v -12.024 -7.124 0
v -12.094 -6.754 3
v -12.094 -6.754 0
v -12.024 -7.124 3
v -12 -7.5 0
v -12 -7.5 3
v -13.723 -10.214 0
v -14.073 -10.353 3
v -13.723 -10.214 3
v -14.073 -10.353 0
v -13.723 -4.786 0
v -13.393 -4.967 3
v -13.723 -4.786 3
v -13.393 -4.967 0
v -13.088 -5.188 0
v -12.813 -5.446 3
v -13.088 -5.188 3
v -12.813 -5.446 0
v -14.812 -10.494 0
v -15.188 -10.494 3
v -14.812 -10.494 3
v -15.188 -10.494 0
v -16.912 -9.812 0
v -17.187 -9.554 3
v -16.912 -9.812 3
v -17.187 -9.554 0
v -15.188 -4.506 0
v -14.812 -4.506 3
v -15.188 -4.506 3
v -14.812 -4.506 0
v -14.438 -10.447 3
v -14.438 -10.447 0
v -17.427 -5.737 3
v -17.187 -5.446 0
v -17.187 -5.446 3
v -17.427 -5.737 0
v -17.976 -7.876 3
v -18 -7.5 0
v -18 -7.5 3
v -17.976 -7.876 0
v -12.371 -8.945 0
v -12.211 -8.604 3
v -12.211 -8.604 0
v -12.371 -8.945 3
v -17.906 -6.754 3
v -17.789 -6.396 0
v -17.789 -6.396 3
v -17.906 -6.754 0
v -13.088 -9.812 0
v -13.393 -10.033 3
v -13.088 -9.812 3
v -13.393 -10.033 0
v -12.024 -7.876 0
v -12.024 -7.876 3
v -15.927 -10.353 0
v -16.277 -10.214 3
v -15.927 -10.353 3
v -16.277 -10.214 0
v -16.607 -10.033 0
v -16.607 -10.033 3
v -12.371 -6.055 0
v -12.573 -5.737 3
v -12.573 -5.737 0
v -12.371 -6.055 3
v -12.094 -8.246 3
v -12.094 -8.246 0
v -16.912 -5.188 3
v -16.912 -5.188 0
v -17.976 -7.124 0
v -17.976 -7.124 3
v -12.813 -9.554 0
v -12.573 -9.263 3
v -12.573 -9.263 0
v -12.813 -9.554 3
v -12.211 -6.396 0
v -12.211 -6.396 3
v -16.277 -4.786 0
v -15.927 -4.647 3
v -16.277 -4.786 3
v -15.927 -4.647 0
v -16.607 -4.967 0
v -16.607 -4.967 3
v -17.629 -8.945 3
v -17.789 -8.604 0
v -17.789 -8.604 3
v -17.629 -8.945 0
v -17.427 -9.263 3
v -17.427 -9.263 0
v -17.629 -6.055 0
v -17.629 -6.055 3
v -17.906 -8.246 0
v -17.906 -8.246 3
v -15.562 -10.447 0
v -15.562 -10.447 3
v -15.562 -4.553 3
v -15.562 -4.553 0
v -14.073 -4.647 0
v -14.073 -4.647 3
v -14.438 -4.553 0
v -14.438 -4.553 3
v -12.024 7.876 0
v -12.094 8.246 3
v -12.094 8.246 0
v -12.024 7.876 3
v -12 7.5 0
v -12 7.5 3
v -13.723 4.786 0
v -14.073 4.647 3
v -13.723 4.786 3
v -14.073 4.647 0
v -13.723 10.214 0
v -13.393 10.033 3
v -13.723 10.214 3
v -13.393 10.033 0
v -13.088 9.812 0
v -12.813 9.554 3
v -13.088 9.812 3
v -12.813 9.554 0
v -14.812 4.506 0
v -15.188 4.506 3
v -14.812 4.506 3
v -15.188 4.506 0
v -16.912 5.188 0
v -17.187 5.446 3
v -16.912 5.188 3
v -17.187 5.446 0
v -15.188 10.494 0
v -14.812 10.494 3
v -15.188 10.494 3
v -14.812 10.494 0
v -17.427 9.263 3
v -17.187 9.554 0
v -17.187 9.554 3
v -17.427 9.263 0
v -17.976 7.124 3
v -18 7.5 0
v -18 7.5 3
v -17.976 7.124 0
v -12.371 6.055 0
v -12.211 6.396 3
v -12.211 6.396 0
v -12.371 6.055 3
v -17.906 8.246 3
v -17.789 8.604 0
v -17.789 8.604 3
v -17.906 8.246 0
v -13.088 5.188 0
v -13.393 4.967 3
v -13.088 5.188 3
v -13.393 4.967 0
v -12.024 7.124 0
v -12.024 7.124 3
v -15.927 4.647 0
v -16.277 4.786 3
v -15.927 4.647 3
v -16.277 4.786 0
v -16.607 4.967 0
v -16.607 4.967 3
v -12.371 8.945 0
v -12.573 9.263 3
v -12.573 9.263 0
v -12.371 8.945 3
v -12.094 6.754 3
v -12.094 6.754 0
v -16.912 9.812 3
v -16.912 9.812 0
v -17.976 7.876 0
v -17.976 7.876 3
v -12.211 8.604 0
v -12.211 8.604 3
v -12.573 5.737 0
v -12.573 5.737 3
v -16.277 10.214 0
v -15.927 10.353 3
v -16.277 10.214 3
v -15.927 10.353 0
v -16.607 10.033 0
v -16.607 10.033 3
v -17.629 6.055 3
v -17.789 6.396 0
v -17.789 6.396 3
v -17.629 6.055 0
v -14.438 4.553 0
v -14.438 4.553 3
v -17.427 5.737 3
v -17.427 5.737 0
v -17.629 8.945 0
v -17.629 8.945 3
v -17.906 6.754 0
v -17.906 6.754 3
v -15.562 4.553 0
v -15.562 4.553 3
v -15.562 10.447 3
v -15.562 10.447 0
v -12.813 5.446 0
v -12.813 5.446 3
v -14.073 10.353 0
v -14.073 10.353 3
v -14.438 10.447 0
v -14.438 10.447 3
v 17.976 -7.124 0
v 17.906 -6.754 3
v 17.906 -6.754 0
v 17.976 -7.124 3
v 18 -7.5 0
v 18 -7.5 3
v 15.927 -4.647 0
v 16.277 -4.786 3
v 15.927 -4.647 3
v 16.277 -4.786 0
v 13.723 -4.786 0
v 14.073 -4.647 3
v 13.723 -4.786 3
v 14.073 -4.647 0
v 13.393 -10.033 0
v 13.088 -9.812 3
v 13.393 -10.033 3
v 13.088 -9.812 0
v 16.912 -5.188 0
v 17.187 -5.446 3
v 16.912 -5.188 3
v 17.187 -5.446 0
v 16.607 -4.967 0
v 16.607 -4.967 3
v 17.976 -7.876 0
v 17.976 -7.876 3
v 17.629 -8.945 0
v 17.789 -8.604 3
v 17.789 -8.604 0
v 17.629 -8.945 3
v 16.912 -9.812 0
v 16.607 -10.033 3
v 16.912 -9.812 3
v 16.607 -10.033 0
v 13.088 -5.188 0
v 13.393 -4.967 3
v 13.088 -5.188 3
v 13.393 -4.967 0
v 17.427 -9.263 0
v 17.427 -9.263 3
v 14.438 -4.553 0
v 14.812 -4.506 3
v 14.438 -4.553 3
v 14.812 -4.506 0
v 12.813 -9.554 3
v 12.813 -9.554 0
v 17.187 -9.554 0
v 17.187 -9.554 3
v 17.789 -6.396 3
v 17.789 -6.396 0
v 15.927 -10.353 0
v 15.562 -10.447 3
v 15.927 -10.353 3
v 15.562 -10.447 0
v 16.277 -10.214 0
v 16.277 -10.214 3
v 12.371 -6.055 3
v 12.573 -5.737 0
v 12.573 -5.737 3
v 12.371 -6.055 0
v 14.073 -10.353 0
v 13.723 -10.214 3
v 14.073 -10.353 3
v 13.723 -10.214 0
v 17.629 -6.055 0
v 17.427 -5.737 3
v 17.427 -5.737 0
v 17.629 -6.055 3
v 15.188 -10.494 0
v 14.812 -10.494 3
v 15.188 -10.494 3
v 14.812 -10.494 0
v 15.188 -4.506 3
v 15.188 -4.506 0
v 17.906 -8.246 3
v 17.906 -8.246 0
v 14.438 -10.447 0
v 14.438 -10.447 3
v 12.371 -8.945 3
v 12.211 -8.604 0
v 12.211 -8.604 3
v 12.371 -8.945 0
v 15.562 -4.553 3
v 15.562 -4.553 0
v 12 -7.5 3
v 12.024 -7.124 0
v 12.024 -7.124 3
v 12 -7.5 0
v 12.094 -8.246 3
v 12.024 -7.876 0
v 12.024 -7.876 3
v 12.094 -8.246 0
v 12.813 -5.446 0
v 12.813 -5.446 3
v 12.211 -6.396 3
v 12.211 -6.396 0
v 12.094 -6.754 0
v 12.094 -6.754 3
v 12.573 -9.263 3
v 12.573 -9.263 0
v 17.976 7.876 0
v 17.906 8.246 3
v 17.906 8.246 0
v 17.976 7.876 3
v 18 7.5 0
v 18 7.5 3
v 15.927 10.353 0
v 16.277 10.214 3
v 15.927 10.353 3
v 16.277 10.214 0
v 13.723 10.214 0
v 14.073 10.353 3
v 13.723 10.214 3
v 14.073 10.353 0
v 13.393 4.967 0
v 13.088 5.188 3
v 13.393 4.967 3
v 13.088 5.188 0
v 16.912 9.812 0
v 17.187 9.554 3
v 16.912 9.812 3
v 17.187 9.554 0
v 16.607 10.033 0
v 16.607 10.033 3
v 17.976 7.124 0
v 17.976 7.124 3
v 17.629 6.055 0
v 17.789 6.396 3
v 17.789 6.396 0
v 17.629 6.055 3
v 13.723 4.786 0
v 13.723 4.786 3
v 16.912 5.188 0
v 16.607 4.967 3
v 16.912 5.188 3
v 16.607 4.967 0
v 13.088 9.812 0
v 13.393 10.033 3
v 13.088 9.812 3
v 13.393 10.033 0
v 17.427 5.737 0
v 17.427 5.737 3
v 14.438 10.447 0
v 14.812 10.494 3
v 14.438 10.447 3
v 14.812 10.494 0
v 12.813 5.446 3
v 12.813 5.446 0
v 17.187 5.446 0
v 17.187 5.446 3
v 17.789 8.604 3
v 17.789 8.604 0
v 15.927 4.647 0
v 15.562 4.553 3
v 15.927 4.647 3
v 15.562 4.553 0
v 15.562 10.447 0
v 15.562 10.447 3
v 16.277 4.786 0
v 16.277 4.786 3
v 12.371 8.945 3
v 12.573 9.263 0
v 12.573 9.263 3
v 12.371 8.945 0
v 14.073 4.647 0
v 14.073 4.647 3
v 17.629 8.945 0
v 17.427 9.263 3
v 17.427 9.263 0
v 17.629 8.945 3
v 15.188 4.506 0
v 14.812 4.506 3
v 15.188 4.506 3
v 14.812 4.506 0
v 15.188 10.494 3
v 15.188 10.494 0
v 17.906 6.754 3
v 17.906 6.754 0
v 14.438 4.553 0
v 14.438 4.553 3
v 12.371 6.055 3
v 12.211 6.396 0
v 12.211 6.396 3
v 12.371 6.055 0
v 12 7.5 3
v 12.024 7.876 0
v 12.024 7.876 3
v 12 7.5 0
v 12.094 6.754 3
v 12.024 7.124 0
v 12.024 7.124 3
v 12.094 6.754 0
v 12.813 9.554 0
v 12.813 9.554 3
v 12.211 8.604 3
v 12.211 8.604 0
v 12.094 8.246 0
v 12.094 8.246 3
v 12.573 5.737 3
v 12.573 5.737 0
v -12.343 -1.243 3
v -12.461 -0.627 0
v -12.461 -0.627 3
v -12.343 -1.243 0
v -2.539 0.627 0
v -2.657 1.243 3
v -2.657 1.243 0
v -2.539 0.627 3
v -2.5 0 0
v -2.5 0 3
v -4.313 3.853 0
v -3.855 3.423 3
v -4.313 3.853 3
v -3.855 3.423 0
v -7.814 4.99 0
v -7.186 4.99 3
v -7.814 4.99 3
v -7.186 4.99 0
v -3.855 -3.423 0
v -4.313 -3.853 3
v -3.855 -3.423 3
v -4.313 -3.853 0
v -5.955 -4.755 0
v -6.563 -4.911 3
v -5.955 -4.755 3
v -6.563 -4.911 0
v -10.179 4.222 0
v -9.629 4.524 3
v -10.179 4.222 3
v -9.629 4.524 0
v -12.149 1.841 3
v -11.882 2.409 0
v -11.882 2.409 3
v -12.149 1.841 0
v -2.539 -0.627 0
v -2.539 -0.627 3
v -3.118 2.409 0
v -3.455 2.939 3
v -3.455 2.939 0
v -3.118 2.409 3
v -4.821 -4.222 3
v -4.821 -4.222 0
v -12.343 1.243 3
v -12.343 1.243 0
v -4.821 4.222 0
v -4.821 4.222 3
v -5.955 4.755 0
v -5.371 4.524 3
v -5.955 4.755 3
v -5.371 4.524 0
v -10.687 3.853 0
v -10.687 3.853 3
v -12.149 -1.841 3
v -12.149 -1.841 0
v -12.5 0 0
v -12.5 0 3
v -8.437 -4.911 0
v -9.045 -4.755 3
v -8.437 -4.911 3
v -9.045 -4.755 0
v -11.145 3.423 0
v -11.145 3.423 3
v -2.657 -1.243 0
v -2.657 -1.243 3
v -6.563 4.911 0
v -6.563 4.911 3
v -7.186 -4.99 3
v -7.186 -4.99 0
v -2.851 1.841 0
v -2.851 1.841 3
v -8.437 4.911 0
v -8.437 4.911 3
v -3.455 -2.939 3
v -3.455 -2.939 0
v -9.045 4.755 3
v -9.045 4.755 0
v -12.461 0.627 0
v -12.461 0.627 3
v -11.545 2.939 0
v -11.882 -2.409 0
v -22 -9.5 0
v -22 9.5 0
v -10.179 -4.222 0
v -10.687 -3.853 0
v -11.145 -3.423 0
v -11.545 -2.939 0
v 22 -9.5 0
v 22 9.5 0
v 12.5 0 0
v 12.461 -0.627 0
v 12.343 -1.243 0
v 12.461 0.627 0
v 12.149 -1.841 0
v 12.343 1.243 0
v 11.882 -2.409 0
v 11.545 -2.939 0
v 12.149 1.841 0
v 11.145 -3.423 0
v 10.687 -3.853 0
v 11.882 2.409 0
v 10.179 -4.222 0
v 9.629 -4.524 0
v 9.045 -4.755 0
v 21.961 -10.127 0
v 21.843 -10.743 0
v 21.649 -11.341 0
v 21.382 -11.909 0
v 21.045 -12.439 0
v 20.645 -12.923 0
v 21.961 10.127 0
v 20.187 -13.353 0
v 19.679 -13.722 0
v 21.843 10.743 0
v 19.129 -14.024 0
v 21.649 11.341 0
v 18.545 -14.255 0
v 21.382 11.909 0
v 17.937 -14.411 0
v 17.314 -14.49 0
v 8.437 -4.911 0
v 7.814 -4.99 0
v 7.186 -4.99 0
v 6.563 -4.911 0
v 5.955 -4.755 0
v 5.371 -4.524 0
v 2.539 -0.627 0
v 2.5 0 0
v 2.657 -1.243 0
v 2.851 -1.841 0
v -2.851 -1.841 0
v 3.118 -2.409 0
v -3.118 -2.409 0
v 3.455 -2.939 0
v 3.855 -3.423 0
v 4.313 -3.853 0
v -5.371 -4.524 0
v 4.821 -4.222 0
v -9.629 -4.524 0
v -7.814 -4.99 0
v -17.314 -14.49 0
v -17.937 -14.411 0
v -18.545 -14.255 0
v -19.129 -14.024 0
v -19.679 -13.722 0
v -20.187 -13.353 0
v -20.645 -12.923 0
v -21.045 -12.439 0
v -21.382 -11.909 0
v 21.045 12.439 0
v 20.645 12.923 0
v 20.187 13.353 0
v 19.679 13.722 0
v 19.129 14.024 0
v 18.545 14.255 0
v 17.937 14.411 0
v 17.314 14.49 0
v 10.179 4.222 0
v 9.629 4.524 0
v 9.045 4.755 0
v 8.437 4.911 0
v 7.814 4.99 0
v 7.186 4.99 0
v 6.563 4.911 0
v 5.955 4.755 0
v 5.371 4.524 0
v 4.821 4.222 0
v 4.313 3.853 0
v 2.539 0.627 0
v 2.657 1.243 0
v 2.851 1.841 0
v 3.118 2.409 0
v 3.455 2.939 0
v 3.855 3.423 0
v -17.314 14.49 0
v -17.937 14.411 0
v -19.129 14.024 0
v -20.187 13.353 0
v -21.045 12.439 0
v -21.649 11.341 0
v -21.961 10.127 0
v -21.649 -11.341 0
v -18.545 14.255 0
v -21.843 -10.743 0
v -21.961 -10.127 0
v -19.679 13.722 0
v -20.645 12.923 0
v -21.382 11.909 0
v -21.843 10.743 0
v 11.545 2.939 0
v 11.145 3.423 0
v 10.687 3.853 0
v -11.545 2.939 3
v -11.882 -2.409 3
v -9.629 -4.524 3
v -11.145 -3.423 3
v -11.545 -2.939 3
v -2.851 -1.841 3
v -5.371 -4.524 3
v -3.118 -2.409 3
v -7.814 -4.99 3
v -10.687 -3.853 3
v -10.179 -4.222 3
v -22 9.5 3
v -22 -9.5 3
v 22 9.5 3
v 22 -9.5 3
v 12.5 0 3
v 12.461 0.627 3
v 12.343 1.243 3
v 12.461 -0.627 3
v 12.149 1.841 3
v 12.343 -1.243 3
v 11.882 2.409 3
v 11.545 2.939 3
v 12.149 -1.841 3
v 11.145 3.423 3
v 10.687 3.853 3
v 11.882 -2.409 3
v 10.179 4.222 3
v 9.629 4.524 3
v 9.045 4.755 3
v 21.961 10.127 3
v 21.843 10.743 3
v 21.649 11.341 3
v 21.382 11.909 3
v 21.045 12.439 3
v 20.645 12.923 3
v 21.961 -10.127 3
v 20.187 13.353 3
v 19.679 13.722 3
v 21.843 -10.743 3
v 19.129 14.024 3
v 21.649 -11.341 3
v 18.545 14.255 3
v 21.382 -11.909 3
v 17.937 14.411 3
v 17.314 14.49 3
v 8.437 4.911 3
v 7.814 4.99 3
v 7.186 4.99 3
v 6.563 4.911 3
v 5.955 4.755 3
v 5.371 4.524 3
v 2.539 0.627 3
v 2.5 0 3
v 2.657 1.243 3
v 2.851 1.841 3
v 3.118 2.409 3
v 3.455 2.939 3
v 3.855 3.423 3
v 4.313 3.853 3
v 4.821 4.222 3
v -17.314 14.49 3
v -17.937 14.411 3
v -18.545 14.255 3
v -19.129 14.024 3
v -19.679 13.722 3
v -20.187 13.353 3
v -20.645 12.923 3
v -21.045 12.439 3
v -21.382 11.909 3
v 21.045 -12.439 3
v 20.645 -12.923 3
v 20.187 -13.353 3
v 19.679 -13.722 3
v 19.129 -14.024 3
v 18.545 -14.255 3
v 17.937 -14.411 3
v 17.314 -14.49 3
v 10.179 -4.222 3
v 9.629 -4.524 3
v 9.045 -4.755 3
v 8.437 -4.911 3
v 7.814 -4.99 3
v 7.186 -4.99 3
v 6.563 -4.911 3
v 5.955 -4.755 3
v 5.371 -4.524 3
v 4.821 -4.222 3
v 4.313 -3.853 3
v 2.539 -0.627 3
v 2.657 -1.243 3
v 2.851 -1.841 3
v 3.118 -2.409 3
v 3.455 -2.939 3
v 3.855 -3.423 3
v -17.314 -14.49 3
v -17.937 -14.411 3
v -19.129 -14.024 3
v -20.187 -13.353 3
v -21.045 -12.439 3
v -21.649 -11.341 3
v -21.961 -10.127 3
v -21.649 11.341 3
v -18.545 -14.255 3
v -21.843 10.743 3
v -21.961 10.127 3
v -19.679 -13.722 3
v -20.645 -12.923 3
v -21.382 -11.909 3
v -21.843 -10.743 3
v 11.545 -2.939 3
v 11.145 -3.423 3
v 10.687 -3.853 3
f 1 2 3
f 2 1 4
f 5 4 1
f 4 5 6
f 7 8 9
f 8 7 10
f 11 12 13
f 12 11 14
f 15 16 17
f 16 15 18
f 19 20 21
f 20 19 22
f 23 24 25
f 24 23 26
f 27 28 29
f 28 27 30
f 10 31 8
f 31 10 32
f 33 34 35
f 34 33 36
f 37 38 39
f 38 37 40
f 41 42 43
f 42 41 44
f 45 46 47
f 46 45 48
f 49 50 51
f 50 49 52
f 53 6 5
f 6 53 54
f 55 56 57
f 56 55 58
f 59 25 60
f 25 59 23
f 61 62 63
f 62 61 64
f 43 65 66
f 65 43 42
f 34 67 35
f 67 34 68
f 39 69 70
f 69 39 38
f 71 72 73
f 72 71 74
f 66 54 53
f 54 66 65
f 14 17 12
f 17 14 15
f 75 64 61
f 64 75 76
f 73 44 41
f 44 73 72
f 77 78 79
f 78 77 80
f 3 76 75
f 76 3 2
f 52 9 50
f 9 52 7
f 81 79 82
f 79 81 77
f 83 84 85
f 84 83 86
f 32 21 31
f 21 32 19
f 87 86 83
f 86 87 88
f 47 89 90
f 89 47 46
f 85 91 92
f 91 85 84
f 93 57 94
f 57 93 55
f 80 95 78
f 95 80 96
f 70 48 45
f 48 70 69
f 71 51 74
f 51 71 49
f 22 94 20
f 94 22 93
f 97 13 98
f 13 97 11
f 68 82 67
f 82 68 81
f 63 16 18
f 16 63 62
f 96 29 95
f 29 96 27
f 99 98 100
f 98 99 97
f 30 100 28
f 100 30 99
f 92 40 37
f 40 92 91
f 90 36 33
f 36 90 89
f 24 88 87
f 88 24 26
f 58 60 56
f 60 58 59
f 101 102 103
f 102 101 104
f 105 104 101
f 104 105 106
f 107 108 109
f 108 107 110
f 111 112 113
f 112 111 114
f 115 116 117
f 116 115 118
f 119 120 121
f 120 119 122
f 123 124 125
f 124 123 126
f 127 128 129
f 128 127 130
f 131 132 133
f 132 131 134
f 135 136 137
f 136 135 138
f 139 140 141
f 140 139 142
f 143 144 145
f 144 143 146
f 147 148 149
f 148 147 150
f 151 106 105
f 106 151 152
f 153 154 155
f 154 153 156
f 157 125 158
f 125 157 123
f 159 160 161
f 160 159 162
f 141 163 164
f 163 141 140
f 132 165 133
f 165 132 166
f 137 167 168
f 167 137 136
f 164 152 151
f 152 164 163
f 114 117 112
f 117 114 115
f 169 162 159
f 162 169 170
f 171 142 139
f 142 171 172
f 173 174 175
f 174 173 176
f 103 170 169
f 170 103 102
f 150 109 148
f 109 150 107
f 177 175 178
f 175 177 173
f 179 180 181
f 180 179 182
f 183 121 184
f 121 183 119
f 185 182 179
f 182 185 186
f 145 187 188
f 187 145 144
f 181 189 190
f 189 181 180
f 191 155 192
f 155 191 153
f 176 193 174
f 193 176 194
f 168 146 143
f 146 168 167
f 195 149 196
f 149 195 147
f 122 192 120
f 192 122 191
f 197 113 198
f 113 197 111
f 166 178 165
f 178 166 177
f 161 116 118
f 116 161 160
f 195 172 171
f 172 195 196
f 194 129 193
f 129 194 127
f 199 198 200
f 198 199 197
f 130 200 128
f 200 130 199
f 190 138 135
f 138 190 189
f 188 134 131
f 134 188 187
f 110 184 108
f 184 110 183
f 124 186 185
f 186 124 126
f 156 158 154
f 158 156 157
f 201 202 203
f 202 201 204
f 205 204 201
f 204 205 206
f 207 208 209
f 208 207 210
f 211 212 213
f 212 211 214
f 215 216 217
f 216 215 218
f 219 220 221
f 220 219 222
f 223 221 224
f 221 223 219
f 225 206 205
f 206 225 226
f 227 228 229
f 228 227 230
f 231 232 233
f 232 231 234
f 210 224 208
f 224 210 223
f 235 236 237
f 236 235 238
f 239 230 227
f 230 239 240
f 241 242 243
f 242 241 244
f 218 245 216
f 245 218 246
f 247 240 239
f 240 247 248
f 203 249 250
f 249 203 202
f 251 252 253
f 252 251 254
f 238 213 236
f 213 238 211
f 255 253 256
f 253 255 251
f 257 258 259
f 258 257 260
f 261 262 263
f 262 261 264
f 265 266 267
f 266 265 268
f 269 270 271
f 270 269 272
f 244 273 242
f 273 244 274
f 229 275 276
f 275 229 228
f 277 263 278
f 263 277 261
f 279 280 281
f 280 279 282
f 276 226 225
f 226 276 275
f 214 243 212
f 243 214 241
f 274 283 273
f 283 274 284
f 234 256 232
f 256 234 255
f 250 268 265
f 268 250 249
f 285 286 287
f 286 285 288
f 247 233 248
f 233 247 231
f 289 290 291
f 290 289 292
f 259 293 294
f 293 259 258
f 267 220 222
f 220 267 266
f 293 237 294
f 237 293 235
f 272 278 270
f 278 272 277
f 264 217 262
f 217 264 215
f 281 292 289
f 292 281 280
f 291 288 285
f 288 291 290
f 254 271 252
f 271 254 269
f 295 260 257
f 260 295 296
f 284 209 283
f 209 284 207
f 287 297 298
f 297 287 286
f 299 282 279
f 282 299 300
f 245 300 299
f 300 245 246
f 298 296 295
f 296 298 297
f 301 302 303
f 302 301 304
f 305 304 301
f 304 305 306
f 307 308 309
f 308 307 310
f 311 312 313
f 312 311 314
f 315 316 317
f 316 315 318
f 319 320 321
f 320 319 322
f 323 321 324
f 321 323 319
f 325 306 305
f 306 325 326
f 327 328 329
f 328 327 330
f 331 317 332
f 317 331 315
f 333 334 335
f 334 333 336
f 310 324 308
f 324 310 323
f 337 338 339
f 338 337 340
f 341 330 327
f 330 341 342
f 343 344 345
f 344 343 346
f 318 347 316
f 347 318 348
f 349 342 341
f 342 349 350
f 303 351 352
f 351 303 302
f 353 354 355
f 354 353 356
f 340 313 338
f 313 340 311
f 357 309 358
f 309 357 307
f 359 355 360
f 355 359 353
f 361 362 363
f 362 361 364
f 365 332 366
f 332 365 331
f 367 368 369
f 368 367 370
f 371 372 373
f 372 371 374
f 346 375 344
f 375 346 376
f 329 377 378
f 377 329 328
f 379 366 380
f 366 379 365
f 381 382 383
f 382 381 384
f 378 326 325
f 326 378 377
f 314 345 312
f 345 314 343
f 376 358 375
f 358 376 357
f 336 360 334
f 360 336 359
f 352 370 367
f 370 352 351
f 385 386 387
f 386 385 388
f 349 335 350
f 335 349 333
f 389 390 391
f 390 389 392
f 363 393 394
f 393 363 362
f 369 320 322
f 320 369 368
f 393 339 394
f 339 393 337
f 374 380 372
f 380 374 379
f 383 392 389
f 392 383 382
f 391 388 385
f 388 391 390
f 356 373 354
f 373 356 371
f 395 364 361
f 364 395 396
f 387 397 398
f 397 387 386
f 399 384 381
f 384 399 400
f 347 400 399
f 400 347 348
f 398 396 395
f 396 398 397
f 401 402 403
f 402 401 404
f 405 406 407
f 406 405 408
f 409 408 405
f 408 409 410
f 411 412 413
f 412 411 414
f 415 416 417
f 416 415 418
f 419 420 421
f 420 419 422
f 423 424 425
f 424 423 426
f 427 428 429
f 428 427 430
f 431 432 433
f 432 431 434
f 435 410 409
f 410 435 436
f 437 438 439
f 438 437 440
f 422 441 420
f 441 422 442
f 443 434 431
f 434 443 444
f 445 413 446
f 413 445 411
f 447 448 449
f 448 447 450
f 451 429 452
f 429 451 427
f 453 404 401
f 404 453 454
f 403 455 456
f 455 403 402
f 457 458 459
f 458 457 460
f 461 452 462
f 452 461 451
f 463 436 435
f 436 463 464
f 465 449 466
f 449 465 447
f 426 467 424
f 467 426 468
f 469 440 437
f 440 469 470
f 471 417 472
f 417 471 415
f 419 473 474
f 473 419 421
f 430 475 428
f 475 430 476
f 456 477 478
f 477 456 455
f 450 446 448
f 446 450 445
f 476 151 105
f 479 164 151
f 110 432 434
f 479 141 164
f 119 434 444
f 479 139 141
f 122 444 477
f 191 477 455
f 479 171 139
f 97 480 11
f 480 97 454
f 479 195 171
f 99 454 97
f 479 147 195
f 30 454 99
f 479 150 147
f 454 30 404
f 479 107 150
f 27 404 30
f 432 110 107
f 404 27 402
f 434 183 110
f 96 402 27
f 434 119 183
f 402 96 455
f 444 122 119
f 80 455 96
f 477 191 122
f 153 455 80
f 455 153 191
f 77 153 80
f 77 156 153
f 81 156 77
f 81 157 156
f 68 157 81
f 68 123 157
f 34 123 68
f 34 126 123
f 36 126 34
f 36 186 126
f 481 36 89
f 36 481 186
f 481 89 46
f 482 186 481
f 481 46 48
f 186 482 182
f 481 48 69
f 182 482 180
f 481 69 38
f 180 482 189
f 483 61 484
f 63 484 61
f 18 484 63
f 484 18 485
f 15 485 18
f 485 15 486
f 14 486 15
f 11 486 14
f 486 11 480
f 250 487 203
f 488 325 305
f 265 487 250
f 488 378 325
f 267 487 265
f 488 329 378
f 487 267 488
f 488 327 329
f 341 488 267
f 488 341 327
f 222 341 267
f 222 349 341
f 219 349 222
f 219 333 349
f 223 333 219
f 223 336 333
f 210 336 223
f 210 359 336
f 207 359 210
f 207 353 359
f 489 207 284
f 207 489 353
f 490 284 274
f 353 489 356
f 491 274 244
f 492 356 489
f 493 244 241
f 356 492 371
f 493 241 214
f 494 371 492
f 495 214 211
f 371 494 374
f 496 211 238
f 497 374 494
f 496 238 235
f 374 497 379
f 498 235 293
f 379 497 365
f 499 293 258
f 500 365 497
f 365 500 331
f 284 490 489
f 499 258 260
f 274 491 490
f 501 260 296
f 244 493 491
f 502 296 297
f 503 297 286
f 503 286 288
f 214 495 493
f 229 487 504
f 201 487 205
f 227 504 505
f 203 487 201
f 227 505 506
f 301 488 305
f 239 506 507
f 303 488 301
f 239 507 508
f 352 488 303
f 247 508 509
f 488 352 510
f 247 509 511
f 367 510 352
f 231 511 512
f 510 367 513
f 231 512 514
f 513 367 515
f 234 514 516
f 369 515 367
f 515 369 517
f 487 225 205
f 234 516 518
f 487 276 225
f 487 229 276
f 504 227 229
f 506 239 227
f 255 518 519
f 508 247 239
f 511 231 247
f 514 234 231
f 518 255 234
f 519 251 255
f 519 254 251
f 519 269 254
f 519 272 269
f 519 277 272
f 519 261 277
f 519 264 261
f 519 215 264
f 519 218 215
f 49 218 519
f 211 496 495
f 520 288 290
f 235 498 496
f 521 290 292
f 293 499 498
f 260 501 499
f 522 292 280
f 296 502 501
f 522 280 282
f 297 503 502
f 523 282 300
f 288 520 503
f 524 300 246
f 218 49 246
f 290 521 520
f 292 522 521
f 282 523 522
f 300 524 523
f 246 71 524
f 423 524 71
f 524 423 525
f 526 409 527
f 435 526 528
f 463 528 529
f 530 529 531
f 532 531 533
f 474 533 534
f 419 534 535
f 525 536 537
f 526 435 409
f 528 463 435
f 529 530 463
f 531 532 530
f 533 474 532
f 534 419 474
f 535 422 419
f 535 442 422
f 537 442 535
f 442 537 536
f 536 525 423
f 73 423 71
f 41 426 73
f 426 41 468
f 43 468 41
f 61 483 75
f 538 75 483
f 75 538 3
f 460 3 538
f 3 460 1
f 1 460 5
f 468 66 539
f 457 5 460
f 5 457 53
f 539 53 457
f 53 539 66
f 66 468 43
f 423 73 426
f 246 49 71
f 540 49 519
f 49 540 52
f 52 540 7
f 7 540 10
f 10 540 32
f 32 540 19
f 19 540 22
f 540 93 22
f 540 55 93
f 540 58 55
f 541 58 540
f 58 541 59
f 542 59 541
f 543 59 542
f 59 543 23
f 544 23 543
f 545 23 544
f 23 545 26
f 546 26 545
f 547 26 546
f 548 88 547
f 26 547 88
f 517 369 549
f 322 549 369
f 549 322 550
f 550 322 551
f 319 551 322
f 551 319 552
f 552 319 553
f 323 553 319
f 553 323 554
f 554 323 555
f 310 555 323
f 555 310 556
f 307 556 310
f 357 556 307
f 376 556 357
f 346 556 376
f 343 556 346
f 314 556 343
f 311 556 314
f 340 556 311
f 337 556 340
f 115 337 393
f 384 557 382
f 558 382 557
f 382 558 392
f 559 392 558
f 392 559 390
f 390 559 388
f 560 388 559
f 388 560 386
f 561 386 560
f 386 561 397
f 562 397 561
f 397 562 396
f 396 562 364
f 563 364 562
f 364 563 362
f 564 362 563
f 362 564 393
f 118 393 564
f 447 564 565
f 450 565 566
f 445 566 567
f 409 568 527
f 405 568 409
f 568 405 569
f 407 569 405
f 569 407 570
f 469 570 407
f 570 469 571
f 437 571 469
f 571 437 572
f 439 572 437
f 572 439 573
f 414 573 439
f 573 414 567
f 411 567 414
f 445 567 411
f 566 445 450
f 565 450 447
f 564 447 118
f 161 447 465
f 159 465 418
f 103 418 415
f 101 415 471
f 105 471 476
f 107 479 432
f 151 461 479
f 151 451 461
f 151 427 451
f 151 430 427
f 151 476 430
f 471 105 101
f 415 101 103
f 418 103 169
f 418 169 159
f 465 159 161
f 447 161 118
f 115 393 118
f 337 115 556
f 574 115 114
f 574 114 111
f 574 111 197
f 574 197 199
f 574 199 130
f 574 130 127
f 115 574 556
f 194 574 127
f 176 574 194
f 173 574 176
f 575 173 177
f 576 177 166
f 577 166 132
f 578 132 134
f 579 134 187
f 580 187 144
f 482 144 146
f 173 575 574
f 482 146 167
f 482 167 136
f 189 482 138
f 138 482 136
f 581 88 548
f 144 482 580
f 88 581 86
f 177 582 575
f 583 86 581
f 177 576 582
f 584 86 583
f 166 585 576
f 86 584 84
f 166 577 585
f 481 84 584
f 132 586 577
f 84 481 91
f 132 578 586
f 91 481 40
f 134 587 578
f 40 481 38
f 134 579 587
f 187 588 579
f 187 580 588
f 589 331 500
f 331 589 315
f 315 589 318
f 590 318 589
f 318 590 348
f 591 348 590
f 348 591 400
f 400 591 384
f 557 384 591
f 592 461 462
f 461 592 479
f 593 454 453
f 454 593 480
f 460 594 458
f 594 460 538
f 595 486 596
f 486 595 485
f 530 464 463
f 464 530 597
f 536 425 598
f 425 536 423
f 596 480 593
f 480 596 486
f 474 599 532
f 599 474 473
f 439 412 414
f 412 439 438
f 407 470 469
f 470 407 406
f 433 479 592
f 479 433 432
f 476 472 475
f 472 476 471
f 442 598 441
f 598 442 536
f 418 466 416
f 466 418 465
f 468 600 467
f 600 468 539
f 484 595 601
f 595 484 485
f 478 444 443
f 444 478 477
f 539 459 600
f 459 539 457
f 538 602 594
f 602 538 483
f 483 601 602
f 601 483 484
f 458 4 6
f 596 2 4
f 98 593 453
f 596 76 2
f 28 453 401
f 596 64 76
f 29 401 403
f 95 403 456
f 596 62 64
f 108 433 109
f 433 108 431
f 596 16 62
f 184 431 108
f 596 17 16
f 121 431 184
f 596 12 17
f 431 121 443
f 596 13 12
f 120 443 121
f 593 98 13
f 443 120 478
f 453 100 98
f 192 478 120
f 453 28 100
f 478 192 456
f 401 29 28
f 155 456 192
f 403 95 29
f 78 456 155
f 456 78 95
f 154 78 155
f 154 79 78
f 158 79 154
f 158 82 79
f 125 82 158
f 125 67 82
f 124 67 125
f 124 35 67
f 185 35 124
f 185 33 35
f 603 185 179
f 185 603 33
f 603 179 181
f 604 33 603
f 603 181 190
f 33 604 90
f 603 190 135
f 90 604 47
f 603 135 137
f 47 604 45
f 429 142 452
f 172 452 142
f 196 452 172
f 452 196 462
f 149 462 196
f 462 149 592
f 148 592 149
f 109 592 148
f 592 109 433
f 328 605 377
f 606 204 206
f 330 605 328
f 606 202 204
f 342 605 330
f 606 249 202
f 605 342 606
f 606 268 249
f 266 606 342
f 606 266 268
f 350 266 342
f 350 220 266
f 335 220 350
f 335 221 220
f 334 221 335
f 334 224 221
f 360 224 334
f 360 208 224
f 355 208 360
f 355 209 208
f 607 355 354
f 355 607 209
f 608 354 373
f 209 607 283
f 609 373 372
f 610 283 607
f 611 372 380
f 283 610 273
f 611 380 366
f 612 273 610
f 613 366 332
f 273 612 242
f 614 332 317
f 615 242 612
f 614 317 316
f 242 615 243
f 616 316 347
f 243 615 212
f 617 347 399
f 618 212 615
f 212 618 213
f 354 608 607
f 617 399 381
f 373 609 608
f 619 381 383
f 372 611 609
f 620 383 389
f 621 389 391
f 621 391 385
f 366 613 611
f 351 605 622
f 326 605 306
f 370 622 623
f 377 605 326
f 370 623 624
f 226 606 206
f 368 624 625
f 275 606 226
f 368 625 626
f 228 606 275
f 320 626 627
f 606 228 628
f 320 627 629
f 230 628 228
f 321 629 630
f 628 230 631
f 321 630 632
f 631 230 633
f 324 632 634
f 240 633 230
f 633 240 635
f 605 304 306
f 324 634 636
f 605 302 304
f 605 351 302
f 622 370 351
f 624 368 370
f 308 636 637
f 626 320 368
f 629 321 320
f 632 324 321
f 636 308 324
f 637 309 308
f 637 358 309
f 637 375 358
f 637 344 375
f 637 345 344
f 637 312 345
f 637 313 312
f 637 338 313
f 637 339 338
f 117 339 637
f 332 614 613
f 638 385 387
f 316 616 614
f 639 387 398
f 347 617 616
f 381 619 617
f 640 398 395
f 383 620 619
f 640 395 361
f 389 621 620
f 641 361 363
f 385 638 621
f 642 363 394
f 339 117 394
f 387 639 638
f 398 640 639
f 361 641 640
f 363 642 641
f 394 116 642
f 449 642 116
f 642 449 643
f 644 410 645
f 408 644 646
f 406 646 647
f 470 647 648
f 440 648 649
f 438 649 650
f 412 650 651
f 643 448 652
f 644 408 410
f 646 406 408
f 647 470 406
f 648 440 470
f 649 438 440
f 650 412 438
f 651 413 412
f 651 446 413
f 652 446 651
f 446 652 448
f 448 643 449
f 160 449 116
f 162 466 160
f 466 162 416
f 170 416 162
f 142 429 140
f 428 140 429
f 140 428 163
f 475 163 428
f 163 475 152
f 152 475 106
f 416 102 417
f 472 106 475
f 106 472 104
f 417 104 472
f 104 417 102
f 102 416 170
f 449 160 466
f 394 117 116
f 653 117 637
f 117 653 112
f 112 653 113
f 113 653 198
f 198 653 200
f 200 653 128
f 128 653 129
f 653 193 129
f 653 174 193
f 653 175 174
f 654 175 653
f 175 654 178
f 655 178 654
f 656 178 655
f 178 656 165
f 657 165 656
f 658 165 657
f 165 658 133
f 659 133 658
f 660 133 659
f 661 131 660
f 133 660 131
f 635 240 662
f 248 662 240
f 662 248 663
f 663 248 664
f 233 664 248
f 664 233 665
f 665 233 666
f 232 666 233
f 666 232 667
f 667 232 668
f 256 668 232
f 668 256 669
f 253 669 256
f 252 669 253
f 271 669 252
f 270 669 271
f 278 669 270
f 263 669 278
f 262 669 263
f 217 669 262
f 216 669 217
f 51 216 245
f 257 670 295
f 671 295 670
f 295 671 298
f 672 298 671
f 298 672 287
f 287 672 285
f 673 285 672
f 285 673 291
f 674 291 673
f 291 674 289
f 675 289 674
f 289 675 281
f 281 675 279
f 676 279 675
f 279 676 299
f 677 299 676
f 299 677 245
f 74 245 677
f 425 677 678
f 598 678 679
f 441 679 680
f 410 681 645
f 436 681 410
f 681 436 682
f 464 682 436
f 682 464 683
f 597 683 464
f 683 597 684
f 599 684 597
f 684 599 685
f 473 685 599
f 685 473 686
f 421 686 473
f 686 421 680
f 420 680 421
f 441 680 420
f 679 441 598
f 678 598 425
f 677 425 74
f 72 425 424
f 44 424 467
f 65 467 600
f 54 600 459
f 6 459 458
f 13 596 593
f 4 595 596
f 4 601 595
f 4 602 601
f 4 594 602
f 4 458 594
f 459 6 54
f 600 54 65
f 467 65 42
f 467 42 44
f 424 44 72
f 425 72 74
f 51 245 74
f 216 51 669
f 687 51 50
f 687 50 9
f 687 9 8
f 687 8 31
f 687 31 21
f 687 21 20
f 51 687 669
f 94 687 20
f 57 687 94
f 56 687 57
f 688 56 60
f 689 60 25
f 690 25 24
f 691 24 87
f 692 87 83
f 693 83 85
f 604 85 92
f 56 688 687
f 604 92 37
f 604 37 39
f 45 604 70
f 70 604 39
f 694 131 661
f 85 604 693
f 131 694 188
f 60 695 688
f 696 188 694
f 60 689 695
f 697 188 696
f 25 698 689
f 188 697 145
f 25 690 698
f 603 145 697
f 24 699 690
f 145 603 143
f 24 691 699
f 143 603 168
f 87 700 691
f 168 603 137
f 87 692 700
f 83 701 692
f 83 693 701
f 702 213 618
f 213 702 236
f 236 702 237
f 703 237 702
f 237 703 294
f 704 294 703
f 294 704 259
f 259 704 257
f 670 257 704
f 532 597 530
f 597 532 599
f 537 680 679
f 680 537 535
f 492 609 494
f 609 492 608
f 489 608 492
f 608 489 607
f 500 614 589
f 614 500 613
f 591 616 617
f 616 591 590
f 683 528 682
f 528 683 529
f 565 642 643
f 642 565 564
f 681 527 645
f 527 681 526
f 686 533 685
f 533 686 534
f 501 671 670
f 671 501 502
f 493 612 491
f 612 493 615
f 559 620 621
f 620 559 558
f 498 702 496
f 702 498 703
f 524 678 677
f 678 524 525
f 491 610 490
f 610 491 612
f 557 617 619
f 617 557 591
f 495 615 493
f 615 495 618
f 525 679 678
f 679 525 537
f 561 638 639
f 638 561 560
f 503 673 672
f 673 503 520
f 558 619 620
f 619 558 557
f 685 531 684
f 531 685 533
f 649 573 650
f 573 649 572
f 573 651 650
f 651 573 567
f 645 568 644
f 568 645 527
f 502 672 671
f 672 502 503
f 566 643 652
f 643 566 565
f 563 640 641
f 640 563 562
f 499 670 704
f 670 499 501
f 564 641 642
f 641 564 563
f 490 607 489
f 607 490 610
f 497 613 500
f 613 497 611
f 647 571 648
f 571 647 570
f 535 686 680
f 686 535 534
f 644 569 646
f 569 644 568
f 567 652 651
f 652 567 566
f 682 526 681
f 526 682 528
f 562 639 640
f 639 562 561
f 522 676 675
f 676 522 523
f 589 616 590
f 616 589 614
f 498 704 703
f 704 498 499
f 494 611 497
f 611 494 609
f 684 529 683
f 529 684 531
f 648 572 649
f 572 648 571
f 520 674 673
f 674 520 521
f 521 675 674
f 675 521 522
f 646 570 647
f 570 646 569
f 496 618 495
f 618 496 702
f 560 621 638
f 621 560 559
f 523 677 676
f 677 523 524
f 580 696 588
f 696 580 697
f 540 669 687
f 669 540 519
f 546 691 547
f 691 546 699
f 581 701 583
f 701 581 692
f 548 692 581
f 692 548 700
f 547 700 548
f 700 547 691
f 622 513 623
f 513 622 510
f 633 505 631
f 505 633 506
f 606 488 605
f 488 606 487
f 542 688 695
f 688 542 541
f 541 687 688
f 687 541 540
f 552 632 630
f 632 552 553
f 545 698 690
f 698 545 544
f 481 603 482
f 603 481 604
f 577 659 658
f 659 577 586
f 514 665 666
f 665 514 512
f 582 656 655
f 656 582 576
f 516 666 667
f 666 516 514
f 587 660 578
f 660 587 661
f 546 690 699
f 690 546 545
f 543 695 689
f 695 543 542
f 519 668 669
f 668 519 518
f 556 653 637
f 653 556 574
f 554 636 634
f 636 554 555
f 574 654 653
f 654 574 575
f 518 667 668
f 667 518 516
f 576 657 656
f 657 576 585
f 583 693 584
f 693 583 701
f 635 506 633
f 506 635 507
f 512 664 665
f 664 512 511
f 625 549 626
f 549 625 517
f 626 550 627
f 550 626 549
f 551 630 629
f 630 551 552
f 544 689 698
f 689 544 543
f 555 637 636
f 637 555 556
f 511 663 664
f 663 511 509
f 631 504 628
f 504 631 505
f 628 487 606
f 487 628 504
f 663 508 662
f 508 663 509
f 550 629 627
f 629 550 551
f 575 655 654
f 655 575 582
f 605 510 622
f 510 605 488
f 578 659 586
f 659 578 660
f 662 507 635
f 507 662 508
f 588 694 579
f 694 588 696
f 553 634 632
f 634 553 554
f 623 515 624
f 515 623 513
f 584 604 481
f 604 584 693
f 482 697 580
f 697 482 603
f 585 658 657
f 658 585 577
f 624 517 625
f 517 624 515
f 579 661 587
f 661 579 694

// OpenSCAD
$fn = 50;


difference() {
	union() {
		hull() {
			translate(v = [-17.0000000000, 9.5000000000, 0]) {
				cylinder(h = 3, r = 5);
			}
			translate(v = [17.0000000000, 9.5000000000, 0]) {
				cylinder(h = 3, r = 5);
			}
			translate(v = [-17.0000000000, -9.5000000000, 0]) {
				cylinder(h = 3, r = 5);
			}
			translate(v = [17.0000000000, -9.5000000000, 0]) {
				cylinder(h = 3, r = 5);
			}
		}
	}
	union() {
		#translate(v = [-15.0000000000, -7.5000000000, -100.0000000000]) {
			cylinder(h = 200, r = 3.0000000000);
		}
		#translate(v = [-15.0000000000, 7.5000000000, -100.0000000000]) {
			cylinder(h = 200, r = 3.0000000000);
		}
		#translate(v = [15.0000000000, -7.5000000000, -100.0000000000]) {
			cylinder(h = 200, r = 3.0000000000);
		}
		#translate(v = [15.0000000000, 7.5000000000, -100.0000000000]) {
			cylinder(h = 200, r = 3.0000000000);
		}
		#translate(v = [-7.5000000000, 0, 0]) {
			cylinder(h = 3, r = 5.0000000000);
		}
		#translate(v = [7.5000000000, 0, 0]) {
			cylinder(h = 3, r = 5.0000000000);
		}
	}
}
